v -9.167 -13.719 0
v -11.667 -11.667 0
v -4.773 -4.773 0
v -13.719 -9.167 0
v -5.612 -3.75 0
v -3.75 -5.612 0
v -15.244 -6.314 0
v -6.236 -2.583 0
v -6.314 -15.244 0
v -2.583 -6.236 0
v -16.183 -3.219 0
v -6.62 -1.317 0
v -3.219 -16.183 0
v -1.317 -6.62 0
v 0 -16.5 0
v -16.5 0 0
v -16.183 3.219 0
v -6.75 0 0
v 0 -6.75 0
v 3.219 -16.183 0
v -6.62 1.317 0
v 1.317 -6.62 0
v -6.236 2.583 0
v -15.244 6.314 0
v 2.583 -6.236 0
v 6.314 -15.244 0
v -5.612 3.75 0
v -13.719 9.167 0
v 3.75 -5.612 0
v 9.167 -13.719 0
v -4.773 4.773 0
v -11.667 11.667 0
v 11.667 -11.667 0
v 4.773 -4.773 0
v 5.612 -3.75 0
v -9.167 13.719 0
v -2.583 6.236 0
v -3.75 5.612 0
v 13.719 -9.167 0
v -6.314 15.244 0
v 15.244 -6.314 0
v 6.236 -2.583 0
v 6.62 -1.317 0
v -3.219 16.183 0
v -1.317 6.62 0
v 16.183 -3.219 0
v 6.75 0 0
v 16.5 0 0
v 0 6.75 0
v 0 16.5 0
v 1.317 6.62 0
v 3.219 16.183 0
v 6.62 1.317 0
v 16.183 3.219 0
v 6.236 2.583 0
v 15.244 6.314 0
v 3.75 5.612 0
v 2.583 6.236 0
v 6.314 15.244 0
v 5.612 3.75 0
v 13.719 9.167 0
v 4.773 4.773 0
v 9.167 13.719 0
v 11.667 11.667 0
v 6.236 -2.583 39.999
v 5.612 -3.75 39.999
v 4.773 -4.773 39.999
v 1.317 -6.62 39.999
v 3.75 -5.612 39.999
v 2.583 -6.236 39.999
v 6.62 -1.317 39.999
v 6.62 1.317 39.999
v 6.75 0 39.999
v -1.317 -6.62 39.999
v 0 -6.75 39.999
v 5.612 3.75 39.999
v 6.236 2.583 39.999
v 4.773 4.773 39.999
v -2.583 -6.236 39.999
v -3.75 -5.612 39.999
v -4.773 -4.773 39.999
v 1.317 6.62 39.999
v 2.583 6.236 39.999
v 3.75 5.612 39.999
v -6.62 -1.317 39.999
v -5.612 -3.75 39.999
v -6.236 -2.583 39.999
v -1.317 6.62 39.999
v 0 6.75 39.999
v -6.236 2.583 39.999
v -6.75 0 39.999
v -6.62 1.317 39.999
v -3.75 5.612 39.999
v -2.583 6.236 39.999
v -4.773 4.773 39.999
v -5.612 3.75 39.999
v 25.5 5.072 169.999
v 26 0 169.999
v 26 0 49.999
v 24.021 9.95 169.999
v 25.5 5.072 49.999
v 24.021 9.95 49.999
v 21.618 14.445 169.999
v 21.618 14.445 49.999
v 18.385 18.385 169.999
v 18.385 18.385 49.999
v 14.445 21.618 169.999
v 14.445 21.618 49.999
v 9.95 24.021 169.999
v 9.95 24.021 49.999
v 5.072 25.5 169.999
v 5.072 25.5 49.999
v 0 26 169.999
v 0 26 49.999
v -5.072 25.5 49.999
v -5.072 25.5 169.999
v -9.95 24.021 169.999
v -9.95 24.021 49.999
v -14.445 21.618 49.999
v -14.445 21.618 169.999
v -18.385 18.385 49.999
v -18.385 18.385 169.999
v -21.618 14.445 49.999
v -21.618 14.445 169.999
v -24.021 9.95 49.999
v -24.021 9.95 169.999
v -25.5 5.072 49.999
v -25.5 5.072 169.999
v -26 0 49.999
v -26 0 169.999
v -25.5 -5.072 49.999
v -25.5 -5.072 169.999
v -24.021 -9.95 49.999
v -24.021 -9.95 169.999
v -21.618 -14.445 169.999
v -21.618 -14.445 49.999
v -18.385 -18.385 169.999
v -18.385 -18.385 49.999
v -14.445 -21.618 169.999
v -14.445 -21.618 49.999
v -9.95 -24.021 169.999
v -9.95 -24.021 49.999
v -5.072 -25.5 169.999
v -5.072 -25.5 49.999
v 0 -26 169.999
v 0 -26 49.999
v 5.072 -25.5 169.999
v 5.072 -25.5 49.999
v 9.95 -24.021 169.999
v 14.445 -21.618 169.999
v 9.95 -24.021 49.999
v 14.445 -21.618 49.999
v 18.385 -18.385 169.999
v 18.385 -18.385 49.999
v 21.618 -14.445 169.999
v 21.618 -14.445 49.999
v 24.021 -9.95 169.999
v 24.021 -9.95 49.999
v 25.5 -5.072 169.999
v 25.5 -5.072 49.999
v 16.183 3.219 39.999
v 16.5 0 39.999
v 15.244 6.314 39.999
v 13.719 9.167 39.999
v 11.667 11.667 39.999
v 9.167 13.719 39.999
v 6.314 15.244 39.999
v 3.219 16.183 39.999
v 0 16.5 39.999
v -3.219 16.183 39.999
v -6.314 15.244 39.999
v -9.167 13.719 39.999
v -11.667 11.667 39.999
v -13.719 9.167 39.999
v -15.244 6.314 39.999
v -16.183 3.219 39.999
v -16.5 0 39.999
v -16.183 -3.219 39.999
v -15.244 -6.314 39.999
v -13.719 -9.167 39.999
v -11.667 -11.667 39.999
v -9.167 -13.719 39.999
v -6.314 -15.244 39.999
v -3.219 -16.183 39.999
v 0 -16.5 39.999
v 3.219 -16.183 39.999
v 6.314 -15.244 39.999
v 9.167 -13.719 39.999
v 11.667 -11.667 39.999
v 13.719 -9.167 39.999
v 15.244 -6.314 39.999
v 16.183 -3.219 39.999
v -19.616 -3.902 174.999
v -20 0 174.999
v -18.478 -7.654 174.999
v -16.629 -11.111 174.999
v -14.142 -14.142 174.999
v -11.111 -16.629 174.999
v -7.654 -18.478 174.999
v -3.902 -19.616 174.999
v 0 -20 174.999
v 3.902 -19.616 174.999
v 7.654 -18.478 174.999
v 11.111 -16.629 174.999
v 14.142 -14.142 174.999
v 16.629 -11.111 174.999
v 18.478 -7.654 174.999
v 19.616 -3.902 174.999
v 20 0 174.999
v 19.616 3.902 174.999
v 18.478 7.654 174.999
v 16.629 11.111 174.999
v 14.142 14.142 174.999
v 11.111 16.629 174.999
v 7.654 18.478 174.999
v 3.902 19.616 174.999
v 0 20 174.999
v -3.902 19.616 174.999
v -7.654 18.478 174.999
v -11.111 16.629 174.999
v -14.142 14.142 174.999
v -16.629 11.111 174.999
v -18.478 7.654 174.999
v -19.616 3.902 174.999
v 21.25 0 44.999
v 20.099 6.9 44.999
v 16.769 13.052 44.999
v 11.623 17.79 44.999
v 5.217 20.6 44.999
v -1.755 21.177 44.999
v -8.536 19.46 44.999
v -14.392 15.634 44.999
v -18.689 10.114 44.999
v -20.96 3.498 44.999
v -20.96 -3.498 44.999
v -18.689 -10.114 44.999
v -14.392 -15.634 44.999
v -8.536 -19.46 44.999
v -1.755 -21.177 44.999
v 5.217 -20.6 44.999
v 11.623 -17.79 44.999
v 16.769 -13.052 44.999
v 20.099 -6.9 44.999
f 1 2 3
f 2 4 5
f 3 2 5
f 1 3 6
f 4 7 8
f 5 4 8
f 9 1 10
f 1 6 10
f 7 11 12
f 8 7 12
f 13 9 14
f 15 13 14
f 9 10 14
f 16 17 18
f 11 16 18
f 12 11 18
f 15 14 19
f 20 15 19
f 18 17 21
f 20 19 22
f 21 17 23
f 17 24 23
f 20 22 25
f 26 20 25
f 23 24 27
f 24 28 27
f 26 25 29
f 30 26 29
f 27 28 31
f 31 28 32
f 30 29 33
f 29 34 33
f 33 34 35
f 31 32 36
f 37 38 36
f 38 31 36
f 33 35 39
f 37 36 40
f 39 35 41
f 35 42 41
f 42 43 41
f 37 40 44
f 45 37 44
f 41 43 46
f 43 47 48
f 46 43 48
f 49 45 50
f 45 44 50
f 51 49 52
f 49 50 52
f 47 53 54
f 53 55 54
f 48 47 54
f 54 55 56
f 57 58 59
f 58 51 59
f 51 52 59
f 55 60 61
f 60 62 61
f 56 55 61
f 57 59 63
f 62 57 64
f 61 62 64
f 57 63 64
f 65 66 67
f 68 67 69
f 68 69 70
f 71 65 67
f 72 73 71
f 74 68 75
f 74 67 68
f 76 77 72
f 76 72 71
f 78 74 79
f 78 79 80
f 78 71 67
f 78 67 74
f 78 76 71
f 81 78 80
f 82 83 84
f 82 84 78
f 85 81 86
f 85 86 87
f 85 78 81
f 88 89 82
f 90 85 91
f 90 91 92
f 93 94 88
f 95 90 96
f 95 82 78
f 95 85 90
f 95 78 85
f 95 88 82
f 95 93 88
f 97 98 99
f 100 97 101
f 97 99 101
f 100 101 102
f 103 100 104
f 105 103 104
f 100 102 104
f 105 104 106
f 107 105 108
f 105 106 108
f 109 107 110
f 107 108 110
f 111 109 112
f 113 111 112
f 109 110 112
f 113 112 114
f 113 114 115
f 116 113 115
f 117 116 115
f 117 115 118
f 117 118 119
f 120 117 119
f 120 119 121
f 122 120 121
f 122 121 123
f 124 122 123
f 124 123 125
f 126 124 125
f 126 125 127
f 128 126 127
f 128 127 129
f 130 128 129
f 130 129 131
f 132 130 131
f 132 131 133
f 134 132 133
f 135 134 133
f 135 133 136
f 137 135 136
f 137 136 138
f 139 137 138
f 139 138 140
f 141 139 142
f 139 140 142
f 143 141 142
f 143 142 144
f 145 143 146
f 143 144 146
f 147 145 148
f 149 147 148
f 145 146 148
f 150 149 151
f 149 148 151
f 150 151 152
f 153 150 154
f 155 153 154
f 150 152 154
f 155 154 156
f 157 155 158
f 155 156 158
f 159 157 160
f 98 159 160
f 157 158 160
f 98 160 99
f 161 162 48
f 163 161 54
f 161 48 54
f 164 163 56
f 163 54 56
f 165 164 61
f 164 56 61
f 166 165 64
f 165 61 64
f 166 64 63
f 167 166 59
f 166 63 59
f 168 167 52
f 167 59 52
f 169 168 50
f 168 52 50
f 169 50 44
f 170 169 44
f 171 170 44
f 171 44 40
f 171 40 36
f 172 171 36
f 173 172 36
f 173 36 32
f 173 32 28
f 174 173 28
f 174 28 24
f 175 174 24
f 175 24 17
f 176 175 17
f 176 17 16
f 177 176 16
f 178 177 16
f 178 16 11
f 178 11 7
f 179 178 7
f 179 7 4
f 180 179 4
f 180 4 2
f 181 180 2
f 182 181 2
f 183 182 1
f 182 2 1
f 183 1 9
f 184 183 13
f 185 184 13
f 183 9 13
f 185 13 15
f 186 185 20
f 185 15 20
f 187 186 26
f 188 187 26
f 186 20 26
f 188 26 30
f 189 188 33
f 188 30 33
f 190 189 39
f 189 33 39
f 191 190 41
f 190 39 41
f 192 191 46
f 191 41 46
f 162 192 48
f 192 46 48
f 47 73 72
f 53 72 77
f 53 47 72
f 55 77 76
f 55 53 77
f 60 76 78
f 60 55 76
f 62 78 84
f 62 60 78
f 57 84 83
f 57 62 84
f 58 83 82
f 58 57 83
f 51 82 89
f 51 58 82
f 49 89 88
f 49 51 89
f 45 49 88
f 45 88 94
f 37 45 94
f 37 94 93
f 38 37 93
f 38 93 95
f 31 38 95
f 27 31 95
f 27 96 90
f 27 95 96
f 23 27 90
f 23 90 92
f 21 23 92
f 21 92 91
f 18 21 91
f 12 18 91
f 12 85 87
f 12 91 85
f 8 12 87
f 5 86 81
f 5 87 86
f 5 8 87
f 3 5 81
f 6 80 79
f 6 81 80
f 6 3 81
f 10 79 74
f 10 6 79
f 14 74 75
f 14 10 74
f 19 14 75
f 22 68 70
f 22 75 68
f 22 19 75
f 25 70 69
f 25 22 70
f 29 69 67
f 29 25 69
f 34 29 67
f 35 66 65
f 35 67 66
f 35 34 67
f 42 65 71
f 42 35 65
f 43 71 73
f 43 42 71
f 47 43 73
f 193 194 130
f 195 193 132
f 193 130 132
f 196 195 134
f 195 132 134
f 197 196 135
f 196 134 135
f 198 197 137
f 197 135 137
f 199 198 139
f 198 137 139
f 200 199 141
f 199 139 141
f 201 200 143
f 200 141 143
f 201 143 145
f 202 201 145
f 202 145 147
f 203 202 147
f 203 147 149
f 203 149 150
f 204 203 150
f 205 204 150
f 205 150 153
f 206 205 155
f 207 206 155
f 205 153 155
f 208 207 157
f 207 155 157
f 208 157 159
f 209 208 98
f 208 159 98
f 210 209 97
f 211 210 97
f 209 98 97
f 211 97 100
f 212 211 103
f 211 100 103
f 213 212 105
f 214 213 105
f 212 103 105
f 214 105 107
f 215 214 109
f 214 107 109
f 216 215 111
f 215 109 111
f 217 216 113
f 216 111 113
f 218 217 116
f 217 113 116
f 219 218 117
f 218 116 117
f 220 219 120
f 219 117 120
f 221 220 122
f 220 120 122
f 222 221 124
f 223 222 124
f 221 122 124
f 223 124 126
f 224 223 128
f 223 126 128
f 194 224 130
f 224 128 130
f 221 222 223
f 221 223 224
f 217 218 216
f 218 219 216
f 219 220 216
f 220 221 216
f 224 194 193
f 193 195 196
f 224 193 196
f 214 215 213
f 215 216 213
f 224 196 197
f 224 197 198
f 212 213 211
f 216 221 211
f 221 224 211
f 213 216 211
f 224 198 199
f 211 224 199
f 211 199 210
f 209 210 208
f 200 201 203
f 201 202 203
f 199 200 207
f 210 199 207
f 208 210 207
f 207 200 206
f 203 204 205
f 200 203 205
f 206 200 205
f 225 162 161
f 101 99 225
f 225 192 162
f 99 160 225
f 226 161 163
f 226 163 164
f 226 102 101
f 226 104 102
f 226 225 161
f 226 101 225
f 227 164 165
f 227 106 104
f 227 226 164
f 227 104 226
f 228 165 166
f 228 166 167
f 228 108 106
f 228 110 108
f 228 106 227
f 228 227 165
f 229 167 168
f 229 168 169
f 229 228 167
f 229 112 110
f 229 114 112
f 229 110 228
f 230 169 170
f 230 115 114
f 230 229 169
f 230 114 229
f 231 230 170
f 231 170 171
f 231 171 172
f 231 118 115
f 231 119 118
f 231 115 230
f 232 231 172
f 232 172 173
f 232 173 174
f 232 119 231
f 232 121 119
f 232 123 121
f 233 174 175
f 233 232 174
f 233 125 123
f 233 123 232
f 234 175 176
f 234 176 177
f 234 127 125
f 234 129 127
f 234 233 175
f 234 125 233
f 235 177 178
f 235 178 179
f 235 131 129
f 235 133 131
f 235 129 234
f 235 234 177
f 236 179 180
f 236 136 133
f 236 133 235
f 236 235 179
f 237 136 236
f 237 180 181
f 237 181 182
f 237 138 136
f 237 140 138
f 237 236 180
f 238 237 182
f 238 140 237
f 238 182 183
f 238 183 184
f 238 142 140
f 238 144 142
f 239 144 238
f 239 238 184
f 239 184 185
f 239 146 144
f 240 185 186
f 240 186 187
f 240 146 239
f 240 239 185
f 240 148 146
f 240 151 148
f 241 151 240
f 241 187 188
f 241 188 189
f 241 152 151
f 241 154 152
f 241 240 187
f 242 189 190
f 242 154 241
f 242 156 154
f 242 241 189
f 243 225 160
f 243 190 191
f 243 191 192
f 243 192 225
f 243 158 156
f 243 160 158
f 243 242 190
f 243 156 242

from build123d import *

# Parameters (mm, degrees)
F0_R     = 16.5
F0_R_2   = 6.75
F1_DEPTH = 40
F4_R     = 26
F5_DEPTH = 120


with BuildPart() as f1:
    # F0 (on Top) → F1 (new body)
    with BuildSketch(Plane.XY):
        Circle(F0_R)
        Circle(F0_R_2, mode=Mode.SUBTRACT)
    extrude(amount=F1_DEPTH)

    # F2 (on Front) → F3 (revolve)
    with BuildSketch(Plane.XZ):
        Polygon((0, 39.999226), (16.5, 39.999226), (26, 49.999226), (0, 49.999226), align=None)
    revolve(axis=Axis((0, 0, 44.999226), (0, 0, 1)))

    # F4 (on face) → F5 (join)
    with BuildSketch(Plane.XY.offset(49.999226)):
        Circle(F4_R)
    extrude(amount=F5_DEPTH)

    # F6 (on Front) → F7 (revolve)
    with BuildSketch(Plane.XZ):
        Polygon((0, 169.999226), (0, 174.999226), (-20, 174.999226), (-26, 169.999226), align=None)
    revolve(axis=Axis((0, 0, 172.499226), (0, 0, 1)))


solid = f1.part
